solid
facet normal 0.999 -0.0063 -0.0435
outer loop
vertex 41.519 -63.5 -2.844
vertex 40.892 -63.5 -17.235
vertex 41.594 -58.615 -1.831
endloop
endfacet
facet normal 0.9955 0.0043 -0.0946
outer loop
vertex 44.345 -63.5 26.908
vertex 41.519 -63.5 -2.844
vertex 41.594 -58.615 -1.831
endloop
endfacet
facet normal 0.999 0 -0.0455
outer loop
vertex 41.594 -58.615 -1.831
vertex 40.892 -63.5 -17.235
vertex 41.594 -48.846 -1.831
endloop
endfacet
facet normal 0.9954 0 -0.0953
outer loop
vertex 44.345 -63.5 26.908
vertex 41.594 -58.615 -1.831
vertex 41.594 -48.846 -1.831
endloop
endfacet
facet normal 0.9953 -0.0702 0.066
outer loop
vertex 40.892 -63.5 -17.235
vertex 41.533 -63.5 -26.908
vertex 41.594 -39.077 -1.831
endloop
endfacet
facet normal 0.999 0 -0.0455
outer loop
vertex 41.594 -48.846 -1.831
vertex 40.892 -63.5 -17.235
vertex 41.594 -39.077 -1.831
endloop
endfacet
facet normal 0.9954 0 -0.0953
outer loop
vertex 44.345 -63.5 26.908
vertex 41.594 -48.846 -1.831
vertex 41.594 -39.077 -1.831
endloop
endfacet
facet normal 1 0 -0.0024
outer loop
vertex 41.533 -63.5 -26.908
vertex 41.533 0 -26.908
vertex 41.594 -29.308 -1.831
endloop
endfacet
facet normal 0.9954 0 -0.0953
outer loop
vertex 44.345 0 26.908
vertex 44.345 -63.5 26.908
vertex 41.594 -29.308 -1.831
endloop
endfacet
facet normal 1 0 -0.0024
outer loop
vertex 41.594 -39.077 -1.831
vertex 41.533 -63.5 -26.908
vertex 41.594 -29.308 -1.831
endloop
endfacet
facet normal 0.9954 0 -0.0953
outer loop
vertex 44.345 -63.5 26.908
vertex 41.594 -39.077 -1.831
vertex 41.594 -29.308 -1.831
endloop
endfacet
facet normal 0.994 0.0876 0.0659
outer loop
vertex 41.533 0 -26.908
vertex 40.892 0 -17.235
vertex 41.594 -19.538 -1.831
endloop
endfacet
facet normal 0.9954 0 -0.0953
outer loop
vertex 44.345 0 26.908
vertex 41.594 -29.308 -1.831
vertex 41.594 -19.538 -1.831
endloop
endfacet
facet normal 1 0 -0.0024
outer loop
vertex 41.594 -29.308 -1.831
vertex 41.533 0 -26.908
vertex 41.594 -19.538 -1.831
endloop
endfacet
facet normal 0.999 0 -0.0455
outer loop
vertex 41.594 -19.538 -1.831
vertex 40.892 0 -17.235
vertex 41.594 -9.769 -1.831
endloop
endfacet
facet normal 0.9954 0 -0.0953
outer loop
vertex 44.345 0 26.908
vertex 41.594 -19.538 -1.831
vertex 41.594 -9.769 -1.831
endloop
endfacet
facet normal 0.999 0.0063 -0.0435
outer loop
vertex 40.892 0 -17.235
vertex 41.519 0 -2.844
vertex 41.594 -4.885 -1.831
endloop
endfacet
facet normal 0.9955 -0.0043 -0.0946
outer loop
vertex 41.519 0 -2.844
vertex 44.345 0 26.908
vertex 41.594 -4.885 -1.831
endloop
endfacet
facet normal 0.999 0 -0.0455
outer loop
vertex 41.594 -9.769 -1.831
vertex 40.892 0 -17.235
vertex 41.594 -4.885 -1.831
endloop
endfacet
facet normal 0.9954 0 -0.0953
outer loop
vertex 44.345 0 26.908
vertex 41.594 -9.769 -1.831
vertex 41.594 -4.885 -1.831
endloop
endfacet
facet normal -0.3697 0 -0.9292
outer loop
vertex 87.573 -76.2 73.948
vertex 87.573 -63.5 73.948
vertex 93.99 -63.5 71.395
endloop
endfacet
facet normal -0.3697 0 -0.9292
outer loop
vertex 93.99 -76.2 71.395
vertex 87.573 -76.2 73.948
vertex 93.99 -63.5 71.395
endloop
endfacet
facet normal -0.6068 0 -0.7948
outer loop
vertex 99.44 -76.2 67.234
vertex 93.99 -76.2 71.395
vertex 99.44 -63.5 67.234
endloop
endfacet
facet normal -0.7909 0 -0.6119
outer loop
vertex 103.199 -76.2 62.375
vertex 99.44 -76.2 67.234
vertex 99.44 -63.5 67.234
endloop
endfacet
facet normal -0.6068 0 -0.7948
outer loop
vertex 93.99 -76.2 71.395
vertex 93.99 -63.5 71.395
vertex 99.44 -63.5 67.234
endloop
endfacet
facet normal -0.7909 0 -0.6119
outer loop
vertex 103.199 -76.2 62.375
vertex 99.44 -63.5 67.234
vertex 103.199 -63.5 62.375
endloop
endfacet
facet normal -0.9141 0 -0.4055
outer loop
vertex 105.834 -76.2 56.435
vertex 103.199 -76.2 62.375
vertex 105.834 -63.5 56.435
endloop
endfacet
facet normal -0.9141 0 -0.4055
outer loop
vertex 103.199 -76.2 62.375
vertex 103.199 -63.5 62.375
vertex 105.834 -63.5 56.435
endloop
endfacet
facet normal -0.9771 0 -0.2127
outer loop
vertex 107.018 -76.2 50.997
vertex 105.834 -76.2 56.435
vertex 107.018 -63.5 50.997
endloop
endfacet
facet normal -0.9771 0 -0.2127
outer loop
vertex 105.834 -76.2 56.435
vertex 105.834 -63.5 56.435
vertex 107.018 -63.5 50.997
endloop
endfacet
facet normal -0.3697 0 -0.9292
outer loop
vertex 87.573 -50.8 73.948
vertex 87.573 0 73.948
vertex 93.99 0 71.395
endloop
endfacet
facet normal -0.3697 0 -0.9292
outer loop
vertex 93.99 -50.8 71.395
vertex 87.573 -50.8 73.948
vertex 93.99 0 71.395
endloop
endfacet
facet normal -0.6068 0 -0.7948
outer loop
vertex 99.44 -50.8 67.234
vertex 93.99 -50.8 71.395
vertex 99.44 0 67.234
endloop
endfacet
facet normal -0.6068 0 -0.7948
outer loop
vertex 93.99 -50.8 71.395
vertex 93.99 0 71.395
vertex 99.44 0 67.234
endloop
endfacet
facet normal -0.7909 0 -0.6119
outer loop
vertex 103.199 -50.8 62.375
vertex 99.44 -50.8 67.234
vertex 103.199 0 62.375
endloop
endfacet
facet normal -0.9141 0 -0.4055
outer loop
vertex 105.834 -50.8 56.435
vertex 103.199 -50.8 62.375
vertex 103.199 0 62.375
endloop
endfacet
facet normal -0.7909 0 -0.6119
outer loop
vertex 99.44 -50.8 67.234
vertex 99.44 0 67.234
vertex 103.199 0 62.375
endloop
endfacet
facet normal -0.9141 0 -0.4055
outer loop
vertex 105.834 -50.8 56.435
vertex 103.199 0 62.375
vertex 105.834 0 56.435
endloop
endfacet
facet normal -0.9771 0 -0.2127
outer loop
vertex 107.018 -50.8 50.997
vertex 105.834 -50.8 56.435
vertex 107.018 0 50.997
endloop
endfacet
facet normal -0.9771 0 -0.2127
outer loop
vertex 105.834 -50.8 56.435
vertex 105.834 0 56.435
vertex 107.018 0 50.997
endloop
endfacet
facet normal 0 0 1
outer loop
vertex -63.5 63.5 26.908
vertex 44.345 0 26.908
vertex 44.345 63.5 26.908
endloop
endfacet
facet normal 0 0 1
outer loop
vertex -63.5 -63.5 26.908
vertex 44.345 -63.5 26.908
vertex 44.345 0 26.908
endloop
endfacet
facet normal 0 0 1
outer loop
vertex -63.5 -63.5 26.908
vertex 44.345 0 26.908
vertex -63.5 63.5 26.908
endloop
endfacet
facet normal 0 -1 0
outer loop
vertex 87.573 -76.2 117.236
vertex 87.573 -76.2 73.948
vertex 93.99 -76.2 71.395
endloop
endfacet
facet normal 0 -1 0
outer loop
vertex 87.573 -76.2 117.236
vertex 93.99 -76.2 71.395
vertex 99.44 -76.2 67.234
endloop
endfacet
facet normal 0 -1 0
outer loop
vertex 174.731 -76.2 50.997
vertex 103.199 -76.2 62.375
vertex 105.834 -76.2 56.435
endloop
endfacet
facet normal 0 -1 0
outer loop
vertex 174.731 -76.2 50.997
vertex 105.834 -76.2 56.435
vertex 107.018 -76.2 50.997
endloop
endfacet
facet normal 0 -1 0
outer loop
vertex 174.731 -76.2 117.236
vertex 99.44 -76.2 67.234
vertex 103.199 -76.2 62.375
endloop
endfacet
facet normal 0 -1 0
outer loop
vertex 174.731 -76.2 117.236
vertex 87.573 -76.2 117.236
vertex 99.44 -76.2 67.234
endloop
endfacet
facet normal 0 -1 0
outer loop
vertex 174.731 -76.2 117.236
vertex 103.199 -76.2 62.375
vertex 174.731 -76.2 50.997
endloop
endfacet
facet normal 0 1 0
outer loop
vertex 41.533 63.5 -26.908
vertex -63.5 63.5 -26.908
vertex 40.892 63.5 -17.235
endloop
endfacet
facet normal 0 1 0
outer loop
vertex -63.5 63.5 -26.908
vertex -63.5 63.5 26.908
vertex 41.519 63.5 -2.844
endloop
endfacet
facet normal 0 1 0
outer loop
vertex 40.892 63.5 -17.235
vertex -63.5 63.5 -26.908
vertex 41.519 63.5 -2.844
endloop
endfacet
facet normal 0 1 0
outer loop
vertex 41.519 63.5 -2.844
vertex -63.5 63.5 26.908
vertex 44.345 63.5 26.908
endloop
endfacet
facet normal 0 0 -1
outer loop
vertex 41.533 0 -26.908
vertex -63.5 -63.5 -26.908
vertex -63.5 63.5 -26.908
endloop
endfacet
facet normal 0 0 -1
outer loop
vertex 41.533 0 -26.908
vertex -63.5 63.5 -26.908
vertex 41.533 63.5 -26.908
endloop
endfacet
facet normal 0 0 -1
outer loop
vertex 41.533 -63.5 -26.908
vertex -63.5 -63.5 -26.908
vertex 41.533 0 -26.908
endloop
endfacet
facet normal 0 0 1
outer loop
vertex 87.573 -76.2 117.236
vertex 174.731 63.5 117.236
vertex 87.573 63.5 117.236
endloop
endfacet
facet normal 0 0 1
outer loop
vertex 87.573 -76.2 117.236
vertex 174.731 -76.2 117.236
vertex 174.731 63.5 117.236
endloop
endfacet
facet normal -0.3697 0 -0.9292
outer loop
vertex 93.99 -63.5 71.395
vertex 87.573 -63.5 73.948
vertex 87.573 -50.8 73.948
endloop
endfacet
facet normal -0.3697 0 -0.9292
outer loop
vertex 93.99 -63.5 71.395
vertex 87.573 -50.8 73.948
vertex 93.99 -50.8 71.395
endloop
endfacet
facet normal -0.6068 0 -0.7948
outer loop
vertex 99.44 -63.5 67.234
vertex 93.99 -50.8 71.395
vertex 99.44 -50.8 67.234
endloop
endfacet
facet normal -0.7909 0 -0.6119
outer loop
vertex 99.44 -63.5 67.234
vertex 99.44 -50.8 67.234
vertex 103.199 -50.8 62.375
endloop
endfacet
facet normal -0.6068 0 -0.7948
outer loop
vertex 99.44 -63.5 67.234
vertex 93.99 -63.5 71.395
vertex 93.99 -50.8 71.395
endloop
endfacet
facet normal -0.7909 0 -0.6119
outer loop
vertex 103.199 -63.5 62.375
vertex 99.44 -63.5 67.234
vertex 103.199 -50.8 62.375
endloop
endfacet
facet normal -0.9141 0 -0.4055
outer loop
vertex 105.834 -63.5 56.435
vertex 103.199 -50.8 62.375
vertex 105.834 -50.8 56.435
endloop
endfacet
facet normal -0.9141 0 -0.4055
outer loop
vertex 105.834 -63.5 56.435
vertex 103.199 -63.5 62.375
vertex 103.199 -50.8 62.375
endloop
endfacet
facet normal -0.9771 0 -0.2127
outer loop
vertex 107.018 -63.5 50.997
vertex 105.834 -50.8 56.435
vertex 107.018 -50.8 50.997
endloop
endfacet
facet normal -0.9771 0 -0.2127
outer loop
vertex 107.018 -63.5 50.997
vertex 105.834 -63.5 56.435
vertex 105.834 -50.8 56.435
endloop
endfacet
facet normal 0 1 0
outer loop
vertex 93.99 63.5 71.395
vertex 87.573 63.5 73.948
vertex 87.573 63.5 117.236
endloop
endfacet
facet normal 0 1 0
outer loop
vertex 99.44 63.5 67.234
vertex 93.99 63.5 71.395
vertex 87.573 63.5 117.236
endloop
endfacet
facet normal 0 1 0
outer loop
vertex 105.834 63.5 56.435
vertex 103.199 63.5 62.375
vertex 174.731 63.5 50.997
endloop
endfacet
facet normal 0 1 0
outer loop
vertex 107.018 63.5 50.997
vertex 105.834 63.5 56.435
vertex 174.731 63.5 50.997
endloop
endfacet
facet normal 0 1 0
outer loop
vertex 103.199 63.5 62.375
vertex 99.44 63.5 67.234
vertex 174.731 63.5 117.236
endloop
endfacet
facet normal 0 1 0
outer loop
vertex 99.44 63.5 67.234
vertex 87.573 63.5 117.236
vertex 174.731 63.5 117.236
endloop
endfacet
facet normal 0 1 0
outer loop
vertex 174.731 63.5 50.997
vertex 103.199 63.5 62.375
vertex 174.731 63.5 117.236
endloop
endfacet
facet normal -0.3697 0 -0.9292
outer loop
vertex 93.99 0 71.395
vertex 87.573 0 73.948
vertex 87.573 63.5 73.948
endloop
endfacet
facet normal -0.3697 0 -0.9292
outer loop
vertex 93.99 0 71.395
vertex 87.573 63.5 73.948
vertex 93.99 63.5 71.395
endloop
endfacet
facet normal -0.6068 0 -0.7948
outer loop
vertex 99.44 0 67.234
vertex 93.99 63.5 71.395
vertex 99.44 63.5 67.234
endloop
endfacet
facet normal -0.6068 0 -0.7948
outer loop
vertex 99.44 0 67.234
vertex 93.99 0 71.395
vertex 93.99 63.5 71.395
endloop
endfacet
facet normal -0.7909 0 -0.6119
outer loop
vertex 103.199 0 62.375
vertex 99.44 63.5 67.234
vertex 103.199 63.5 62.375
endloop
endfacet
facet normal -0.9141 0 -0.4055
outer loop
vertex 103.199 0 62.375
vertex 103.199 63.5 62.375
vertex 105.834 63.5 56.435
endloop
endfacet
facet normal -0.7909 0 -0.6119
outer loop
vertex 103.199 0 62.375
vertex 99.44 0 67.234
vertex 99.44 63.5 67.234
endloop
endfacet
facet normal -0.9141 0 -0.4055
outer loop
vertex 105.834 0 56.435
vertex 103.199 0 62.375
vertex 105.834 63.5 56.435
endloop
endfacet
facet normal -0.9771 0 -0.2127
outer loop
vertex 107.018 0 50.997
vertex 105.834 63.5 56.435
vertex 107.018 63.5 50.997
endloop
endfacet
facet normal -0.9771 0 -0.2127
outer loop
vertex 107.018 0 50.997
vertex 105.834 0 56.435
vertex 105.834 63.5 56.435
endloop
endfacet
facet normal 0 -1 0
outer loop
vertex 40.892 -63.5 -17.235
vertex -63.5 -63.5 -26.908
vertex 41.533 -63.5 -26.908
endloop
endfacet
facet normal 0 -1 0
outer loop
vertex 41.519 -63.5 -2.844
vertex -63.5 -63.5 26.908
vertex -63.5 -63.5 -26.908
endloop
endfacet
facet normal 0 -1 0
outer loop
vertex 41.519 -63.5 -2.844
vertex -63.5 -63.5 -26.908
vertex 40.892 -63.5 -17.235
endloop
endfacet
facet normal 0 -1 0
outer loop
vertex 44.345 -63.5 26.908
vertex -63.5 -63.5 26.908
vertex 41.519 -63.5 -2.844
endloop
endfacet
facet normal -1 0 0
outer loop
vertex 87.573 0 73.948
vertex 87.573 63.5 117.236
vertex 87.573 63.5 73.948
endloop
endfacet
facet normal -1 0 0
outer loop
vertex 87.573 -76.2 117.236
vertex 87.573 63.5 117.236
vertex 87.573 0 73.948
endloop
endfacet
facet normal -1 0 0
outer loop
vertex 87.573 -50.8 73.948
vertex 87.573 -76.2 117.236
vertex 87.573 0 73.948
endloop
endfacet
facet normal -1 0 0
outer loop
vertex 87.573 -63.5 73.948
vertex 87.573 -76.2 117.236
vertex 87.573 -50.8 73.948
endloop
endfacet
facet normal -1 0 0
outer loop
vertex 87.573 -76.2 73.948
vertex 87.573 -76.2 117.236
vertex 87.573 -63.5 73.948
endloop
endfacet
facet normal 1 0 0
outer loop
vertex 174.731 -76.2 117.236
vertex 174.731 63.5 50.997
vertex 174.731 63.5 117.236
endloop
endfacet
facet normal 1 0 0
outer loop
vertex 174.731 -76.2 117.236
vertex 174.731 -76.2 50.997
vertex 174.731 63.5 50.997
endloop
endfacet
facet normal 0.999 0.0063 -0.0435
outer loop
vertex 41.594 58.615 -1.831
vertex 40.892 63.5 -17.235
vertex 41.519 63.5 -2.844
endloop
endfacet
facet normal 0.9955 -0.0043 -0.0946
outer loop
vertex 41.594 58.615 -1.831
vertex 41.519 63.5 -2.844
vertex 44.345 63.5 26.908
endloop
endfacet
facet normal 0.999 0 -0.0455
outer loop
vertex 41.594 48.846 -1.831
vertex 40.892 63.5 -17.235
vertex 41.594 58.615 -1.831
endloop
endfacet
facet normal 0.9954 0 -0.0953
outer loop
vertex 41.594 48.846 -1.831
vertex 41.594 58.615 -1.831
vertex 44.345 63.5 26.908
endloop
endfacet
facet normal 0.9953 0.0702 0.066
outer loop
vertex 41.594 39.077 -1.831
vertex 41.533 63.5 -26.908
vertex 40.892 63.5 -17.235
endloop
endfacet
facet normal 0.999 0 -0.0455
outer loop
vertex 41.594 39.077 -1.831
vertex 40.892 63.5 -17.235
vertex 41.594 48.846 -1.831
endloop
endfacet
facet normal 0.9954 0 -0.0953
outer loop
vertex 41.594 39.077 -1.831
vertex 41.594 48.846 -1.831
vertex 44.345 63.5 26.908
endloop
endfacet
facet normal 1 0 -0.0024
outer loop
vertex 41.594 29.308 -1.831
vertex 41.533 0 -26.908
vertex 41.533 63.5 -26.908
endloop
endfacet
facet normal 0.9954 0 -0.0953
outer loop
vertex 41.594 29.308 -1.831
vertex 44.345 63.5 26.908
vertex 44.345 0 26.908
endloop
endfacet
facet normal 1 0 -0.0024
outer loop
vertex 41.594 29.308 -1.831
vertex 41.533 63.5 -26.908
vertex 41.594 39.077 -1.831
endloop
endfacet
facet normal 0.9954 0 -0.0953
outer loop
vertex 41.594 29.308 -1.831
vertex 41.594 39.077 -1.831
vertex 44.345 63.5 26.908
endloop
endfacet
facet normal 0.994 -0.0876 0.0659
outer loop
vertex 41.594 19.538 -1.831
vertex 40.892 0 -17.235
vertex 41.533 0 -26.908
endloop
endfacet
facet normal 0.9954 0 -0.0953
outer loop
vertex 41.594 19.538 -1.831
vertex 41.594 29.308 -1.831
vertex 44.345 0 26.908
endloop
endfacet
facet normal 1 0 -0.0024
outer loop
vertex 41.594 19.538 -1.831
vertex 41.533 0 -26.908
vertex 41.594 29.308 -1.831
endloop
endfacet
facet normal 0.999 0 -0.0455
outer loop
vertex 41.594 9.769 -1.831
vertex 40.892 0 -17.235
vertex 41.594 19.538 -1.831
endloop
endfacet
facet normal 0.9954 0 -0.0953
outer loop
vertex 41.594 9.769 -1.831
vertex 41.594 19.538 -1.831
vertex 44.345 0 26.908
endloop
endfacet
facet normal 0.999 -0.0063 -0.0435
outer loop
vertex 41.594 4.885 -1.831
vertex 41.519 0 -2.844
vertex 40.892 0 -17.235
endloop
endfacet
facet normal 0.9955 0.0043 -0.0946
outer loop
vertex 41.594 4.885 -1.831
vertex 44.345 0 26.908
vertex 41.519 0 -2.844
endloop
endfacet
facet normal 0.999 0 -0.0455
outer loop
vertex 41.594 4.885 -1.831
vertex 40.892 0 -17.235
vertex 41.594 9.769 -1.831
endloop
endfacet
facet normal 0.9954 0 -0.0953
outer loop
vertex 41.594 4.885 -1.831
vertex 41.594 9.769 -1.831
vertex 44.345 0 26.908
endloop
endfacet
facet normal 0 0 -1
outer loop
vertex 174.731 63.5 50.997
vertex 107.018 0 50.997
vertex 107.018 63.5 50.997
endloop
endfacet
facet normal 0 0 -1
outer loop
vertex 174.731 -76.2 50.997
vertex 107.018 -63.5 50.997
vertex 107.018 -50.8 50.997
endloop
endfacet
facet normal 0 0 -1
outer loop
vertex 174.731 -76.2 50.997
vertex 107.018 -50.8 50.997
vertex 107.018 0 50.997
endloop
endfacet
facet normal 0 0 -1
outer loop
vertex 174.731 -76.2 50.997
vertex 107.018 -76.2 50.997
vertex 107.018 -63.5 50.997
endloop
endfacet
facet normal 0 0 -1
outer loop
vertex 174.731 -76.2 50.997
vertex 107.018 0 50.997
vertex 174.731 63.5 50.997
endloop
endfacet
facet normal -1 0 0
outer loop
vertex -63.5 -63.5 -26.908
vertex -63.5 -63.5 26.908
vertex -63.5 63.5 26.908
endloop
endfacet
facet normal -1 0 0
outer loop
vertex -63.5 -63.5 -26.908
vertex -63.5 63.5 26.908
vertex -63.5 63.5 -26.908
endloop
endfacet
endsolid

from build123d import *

# Parameters (mm, degrees)
F1_DEPTH = 63.5
F2_DEPTH = 12.7


# Not quite as in the source:
# - the dataset's text gives a spline's control points without its knots; the knots are read off the source's solid


with BuildPart() as f1:
    # F0 (on Front) → F1 (new body, symmetric)
    with BuildSketch(Plane.XZ):
        with BuildLine():
            Line((44.3445303026, 26.9082457591), (-63.5, 26.9082457591))
            Line((-63.5, 26.9082457591), (-63.5, -26.9082457591))
            Line((-63.5, -26.9082457591), (41.5330206736, -26.9082457591))
            add(Edge.make_bspline(
                [(41.5330206736, -26.9082457591), (41.5206891704, -26.8319854492), (41.3448448448, -25.7230965065), (41.1156345492, -23.6997117475), (40.9438322264, -20.8519320576), (40.881307, -17.9705748006), (40.9019094918, -14.997119488), (40.9913966742, -11.9042433146), (41.1401351146, -8.6814153594), (41.3407956994, -5.32812682), (41.6692584128, -0.6908531378), (42.1797414921, 5.3943561937), (42.9095362254, 13.0529659742), (43.6478674391, 20.2794962315), (44.1353924709, 24.9222708035), (44.3445303026, 26.9082457591)],
                knots=[0.7488512035, 0.7488512035, 0.7488512035, 0.7488512035, 0.75, 0.765625, 0.78125, 0.796875, 0.8125, 0.828125, 0.84375, 0.859375, 0.875, 0.90625, 0.9375, 0.96875, 0.9921519733, 0.9921519733, 0.9921519733, 0.9921519733], degree=3))
        make_face()
    extrude(amount=F1_DEPTH, both=True)


with BuildPart() as f1b:
    # F0 (on Front) → F1, piece 2 (new body, symmetric)
    with BuildSketch(Plane.XZ):
        with BuildLine():
            add(Edge.make_bspline(
                [(87.5728937206, 73.9479044282), (88.1080690446, 73.8133450078), (89.4580280251, 73.430626286), (91.6770203646, 72.6026408552), (94.1885548405, 71.3450272992), (96.6360890257, 69.7449658053), (98.9231882342, 67.8241603771), (100.9632190462, 65.6409923948), (102.6986997876, 63.2785305227), (104.109828379, 60.8228273116), (105.2096171996, 58.3492731764), (106.0320355859, 55.8959300691), (106.5976249855, 53.5973499201), (106.8784564156, 51.9945597192), (106.99856399, 51.1413742955), (107.0180190242, 50.9972441844)],
                knots=[0.158799995, 0.158799995, 0.158799995, 0.158799995, 0.1640625, 0.171875, 0.1796875, 0.1875, 0.1953125, 0.203125, 0.2109375, 0.21875, 0.2265625, 0.234375, 0.2421875, 0.25, 0.2515962027, 0.2515962027, 0.2515962027, 0.2515962027], degree=3))
            Line((107.0180190242, 50.9972441844), (174.7305428356, 50.9972441844))
            Line((174.7305428356, 50.9972441844), (174.7305428356, 117.2363148355))
            Line((174.7305428356, 117.2363148355), (87.5728937206, 117.2363148355))
            Line((87.5728937206, 117.2363148355), (87.5728937206, 73.9479044282))
        make_face()
    extrude(amount=F1_DEPTH, both=True)

    # F2 (add, symmetric): a face of the model
    f2_faces = [f1b.faces().sort_by_distance(p)[0] for p in [
        (133.2489364203, -63.5, 85.5209468782),
    ]]
    extrude(f2_faces, amount=F2_DEPTH, both=True)


solid = Compound([f1.part, f1b.part])
